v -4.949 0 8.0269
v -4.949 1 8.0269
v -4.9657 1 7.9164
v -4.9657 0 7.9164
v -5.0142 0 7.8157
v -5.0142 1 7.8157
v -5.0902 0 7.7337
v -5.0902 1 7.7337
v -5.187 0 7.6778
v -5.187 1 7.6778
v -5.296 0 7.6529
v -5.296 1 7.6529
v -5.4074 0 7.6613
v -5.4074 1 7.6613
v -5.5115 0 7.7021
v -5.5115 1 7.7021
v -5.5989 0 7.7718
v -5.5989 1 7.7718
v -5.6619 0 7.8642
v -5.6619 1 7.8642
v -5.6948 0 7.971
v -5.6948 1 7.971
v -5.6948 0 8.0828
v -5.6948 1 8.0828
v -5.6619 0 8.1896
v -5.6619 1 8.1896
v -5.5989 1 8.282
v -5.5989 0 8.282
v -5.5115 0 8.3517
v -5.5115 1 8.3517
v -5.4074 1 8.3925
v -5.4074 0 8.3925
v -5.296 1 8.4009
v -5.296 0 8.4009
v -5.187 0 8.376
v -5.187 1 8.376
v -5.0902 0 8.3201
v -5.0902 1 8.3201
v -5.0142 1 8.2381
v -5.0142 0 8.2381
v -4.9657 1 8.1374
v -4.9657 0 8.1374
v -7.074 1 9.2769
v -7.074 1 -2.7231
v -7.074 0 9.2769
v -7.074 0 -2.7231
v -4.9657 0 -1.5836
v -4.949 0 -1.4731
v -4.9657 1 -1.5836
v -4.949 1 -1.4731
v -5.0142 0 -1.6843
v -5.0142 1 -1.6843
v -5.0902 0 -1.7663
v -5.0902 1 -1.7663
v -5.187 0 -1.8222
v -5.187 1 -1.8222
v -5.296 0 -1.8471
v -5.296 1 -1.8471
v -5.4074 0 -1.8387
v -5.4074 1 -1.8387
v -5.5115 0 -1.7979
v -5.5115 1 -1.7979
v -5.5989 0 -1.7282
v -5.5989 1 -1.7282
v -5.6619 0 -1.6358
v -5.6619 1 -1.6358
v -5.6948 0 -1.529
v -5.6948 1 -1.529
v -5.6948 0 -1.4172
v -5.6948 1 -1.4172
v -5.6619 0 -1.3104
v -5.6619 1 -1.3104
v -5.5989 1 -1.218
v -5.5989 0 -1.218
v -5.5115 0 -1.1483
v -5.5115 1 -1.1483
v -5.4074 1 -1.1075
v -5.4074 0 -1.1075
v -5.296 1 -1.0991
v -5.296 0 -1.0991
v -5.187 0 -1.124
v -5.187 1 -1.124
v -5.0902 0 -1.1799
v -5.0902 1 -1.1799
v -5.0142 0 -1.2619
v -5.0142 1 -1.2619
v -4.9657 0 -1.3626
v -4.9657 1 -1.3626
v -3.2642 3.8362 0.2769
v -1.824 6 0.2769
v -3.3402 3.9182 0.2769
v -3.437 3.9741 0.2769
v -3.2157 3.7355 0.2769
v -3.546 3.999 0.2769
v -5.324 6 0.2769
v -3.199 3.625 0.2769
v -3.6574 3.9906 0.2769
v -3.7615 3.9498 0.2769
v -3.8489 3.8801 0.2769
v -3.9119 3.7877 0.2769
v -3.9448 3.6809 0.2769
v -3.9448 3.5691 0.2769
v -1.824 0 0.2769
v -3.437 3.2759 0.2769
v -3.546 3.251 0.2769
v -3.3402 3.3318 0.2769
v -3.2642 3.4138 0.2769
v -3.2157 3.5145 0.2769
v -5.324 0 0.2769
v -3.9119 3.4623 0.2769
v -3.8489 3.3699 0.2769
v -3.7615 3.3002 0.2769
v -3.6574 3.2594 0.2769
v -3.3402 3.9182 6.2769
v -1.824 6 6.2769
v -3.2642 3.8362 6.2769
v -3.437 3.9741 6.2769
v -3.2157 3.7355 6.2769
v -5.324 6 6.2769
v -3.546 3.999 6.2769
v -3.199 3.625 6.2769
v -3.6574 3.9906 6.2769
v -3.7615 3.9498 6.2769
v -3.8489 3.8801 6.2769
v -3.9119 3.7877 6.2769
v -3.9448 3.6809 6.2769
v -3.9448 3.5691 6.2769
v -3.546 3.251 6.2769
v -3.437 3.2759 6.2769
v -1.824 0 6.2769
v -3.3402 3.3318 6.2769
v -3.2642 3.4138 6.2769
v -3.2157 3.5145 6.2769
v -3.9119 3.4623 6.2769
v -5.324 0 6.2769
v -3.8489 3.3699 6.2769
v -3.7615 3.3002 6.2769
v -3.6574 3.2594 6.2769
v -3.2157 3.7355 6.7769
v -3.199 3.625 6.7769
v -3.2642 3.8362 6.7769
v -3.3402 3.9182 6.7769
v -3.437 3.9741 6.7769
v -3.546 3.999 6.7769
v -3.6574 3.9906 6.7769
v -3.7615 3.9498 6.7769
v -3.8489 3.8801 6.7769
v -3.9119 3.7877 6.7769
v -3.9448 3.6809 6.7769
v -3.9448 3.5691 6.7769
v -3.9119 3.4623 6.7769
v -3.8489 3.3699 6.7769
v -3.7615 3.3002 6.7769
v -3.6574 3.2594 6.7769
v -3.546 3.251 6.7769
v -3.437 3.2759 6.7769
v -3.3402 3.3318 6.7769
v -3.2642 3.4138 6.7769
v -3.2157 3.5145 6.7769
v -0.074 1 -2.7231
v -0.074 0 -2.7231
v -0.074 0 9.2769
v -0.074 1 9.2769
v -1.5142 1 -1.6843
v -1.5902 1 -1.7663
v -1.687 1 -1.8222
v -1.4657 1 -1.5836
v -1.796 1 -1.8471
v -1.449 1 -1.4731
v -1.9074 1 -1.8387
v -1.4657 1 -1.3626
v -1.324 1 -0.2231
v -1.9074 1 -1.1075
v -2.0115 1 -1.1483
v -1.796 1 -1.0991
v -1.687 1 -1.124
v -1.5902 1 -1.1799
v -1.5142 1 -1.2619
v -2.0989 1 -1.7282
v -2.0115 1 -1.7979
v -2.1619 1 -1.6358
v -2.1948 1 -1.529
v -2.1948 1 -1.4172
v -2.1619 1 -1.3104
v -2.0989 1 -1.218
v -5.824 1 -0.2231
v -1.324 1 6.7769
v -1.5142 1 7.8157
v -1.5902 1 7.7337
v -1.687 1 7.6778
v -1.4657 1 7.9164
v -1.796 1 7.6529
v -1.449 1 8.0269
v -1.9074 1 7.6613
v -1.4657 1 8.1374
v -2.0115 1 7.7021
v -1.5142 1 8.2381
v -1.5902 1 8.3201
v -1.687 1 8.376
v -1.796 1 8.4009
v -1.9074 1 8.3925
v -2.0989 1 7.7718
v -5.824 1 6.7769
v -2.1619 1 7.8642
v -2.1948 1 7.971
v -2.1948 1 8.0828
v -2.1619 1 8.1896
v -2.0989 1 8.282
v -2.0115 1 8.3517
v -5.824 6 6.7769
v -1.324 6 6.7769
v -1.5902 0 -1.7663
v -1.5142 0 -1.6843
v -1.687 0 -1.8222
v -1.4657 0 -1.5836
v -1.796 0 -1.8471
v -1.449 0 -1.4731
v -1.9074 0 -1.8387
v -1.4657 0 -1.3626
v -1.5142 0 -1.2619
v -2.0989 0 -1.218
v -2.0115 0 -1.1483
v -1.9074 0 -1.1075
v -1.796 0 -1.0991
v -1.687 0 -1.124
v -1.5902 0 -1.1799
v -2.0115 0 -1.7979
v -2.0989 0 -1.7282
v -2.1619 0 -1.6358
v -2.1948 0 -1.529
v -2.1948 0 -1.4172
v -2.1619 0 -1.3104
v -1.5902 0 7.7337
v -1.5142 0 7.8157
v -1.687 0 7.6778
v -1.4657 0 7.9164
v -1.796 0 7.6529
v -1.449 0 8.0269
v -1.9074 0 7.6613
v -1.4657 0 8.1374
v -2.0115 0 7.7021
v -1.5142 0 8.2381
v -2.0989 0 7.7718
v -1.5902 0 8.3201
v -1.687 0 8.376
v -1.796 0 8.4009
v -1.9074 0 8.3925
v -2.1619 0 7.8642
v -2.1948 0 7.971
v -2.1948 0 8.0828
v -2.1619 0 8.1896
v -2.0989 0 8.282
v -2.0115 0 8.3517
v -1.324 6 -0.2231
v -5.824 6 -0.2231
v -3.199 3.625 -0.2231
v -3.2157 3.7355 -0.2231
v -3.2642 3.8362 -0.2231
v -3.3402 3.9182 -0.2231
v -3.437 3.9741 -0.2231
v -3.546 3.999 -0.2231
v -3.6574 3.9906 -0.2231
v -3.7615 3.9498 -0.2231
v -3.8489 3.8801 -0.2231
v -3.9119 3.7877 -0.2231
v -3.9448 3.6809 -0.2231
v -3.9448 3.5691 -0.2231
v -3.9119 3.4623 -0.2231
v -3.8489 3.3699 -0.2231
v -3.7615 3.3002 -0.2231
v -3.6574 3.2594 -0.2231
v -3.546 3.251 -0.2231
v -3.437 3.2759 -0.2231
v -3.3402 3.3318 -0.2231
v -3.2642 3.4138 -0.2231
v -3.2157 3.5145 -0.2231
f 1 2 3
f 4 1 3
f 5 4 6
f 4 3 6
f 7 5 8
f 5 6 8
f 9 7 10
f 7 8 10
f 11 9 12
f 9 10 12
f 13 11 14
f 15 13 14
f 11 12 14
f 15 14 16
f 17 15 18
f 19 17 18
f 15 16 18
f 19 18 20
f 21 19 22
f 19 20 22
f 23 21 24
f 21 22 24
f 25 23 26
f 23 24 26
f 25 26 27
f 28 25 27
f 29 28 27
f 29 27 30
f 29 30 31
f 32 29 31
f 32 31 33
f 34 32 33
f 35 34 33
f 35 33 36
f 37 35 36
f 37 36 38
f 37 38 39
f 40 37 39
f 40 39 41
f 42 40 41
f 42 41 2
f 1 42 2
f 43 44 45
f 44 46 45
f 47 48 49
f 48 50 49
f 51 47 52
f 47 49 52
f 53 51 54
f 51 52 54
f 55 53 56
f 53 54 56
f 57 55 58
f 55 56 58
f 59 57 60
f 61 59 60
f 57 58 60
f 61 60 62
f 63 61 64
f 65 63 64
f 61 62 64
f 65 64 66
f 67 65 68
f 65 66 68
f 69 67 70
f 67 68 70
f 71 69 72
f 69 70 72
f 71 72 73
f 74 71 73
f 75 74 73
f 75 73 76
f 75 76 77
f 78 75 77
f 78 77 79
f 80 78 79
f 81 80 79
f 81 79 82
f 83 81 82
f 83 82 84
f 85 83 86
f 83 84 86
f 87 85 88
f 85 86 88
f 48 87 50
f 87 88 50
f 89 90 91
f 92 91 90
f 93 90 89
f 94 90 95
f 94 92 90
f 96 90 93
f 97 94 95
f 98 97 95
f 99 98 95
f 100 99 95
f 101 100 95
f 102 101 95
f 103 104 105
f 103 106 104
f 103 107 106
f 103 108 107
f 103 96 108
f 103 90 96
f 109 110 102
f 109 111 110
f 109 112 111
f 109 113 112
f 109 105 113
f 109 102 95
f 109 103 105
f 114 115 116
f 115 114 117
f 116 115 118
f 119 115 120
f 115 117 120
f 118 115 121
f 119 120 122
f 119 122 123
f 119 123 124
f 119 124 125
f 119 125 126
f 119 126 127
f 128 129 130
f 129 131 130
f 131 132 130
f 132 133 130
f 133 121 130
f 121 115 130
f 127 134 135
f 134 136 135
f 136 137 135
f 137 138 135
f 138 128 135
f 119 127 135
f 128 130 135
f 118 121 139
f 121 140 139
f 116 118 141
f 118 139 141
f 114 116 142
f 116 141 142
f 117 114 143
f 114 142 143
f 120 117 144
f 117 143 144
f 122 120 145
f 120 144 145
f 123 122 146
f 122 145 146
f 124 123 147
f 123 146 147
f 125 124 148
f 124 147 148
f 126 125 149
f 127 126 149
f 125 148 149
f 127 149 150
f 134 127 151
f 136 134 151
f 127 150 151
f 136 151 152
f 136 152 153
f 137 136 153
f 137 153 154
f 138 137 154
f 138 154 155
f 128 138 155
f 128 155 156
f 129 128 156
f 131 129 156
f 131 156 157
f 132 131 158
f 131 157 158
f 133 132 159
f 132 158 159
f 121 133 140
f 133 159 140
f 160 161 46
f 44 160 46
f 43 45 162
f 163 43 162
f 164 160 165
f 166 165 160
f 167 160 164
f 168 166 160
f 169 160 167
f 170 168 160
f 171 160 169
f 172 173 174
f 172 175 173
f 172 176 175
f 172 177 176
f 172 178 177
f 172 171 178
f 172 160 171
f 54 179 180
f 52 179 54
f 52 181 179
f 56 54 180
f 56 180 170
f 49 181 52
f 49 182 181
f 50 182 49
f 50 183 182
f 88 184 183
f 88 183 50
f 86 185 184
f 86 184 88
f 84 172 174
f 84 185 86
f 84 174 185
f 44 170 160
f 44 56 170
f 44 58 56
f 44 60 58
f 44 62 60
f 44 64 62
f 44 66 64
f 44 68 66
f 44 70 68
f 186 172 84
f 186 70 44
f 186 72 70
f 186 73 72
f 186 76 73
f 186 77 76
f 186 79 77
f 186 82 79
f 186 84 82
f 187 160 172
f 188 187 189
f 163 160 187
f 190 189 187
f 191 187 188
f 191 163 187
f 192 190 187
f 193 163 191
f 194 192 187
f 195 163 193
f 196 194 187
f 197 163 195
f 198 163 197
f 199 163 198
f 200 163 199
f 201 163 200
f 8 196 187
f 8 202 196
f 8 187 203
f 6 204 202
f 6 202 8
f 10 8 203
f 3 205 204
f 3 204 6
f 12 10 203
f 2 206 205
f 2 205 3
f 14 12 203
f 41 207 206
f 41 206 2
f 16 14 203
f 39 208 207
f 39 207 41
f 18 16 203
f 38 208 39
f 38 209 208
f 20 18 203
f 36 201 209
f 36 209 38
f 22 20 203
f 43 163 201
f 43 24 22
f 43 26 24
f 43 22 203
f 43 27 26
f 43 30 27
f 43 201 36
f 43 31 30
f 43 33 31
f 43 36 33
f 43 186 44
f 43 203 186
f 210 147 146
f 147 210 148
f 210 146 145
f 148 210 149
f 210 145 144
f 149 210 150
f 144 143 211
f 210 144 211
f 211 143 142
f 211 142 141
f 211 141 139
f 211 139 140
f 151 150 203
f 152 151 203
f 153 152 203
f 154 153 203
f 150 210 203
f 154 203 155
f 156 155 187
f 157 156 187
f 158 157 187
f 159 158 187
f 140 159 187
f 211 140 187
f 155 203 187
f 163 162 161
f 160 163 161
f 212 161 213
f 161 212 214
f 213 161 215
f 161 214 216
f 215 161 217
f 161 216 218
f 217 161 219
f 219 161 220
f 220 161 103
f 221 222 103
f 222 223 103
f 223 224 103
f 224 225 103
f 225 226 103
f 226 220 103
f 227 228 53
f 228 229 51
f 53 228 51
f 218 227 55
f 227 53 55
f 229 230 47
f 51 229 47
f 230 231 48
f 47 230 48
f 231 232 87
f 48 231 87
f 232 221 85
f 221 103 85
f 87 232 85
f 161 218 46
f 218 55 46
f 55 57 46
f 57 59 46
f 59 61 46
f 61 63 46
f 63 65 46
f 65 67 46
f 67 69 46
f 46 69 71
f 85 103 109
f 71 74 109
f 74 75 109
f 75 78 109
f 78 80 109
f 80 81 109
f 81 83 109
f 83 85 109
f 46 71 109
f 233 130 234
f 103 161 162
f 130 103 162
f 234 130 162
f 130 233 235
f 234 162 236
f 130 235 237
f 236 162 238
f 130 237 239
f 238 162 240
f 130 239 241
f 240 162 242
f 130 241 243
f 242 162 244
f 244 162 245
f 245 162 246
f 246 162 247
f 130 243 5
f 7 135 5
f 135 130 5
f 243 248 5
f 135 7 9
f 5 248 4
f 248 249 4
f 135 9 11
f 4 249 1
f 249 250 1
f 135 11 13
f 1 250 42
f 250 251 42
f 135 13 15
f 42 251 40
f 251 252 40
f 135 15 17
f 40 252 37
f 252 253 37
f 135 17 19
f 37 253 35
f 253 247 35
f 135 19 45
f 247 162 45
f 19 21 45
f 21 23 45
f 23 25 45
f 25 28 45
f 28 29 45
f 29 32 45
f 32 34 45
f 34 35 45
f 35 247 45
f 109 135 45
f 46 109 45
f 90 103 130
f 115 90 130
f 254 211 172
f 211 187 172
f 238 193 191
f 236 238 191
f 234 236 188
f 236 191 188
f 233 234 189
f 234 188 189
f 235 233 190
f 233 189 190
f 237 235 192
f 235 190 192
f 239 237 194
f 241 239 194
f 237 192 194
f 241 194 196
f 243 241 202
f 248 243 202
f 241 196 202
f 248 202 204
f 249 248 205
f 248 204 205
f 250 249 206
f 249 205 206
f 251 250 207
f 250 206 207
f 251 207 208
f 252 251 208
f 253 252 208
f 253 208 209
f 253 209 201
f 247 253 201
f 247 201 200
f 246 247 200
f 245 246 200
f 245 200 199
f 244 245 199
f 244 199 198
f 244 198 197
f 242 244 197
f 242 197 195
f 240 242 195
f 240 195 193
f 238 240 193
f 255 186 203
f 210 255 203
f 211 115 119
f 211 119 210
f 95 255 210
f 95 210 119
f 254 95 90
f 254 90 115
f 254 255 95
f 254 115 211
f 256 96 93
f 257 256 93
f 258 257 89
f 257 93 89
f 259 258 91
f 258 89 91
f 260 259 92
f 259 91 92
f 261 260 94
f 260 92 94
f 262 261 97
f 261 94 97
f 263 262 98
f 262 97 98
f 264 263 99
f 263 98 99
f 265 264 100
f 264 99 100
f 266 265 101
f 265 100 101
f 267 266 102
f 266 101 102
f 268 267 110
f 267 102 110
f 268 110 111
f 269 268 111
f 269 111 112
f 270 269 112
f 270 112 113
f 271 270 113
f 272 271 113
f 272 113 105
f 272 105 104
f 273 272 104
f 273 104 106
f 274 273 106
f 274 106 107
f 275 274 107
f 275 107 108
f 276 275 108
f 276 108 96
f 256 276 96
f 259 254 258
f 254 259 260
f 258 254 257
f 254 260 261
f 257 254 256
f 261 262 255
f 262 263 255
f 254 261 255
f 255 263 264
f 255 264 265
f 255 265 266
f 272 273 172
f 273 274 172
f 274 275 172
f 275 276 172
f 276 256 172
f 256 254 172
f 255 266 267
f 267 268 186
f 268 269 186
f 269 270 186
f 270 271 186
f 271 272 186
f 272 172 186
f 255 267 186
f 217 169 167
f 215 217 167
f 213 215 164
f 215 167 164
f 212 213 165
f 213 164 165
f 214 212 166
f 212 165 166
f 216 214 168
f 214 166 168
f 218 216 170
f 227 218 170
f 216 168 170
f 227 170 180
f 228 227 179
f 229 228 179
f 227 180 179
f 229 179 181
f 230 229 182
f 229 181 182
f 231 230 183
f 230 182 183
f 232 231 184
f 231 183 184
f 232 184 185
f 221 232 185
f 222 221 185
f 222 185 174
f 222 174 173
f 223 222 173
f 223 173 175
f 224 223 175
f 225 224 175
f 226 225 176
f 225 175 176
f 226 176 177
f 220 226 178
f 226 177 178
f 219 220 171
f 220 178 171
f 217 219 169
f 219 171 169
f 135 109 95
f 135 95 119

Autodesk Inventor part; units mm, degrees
ref_plane "YZ Plane" through (0, 0, 0) normal (1, 0, 0) x (0, 1, 0)
ref_plane "XZ Plane" through (0, 0, 0) normal (0, 1, 0) x (-1, 0, 0)
ref_plane "XY Plane" through (0, 0, 0) normal (0, 0, 1) x (1, 0, 0)
sketch "Sketch1" plane through (0, 0, 0) normal (0, 1, 0) x (-1, 0, 0)
  line L0 (7.074, 9.2769) -> (0.074, 9.2769)
  line L1 (0.074, 9.2769) -> (0.074, -2.7231)
  line L2 (0.074, -2.7231) -> (7.074, -2.7231)
  line L3 (7.074, -2.7231) -> (7.074, 9.2769)
  line L4 (5.324, 6.2769) -> (1.824, 6.2769)
  line L5 (1.824, 6.2769) -> (1.824, 0.2769)
  line L6 (1.824, 0.2769) -> (5.324, 0.2769)
  line L7 (5.324, 0.2769) -> (5.324, 6.2769)
  point P0 (0, 0)
  dimension "d0" = 7
  dimension "d1" = 12
  dimension "d28" = 1.75
  dimension "d29" = 1.75
  dimension "d30" = 3
  dimension "d31" = 3
extrude "Extrusion1" add sketch "Sketch1" along normal blind 1
sketch "Sketch3" plane through (0, 1, 0) normal (0, 1, 0) x (1, 0, 0)
  circle A0 centre (-5.324, -8.0269) radius 0.375
  line L0 (-7.074, -9.2769) -> (-0.074, -9.2769) projected
  line L1 (-7.074, 2.7231) -> (-7.074, -9.2769) projected
  circle A1 centre (-1.824, -8.0269) radius 0.375
  circle A2 centre (-5.324, 1.4731) radius 0.375
  circle A3 centre (-1.824, 1.4731) radius 0.375
  point P0 (0, 0)
  dimension "d8" = 0.75
  dimension "d9" = 1.25
  dimension "d10" = 1.75
  dimension "d13" = 3.5
  dimension "d16" = 9.5
extrude "Extrusion3" cut sketch "Sketch3" against normal blind 5
sketch "Sketch7" plane through (0, 1, 0) normal (0, 1, 0) x (1, 0, 0)
  line L0 (-1.824, -6.2769) -> (-5.324, -6.2769) projected
  line L1 (-1.824, -0.2769) -> (-1.824, -6.2769) projected
  line L2 (-5.324, -6.2769) -> (-1.824, -6.2769)
  line L3 (-1.824, -6.2769) -> (-1.824, -0.2769)
  line L4 (-1.824, -0.2769) -> (-5.324, -0.2769)
  line L5 (-5.324, -0.2769) -> (-5.324, -6.2769)
  line L6 (-5.824, -6.7769) -> (-1.324, -6.7769)
  line L7 (-1.324, -6.7769) -> (-1.324, 0.2231)
  line L8 (-1.324, 0.2231) -> (-5.824, 0.2231)
  line L9 (-5.824, 0.2231) -> (-5.824, -6.7769)
  point P0 (0, 0)
  dimension "d32" = 0.5
extrude "Extrusion5" add sketch "Sketch7" along normal blind 5
sketch "Sketch8" plane through (-5.824, 1, 6.7769) normal (0, 0, 1) x (1, 0, 0)
  circle A0 centre (2.25, 2.625) radius 0.375
  line L0 (0, 5) -> (4.5, 5) projected
  line L1 (0, 0) -> (0, 5) projected
  point P0 (5.824, -1)
  dimension "d35" = 0.75
  dimension "d36" = 2
  dimension "d37" = 2.25
extrude "Extrusion6" cut sketch "Sketch8" against normal through all
properties part number "Lens Holder"
